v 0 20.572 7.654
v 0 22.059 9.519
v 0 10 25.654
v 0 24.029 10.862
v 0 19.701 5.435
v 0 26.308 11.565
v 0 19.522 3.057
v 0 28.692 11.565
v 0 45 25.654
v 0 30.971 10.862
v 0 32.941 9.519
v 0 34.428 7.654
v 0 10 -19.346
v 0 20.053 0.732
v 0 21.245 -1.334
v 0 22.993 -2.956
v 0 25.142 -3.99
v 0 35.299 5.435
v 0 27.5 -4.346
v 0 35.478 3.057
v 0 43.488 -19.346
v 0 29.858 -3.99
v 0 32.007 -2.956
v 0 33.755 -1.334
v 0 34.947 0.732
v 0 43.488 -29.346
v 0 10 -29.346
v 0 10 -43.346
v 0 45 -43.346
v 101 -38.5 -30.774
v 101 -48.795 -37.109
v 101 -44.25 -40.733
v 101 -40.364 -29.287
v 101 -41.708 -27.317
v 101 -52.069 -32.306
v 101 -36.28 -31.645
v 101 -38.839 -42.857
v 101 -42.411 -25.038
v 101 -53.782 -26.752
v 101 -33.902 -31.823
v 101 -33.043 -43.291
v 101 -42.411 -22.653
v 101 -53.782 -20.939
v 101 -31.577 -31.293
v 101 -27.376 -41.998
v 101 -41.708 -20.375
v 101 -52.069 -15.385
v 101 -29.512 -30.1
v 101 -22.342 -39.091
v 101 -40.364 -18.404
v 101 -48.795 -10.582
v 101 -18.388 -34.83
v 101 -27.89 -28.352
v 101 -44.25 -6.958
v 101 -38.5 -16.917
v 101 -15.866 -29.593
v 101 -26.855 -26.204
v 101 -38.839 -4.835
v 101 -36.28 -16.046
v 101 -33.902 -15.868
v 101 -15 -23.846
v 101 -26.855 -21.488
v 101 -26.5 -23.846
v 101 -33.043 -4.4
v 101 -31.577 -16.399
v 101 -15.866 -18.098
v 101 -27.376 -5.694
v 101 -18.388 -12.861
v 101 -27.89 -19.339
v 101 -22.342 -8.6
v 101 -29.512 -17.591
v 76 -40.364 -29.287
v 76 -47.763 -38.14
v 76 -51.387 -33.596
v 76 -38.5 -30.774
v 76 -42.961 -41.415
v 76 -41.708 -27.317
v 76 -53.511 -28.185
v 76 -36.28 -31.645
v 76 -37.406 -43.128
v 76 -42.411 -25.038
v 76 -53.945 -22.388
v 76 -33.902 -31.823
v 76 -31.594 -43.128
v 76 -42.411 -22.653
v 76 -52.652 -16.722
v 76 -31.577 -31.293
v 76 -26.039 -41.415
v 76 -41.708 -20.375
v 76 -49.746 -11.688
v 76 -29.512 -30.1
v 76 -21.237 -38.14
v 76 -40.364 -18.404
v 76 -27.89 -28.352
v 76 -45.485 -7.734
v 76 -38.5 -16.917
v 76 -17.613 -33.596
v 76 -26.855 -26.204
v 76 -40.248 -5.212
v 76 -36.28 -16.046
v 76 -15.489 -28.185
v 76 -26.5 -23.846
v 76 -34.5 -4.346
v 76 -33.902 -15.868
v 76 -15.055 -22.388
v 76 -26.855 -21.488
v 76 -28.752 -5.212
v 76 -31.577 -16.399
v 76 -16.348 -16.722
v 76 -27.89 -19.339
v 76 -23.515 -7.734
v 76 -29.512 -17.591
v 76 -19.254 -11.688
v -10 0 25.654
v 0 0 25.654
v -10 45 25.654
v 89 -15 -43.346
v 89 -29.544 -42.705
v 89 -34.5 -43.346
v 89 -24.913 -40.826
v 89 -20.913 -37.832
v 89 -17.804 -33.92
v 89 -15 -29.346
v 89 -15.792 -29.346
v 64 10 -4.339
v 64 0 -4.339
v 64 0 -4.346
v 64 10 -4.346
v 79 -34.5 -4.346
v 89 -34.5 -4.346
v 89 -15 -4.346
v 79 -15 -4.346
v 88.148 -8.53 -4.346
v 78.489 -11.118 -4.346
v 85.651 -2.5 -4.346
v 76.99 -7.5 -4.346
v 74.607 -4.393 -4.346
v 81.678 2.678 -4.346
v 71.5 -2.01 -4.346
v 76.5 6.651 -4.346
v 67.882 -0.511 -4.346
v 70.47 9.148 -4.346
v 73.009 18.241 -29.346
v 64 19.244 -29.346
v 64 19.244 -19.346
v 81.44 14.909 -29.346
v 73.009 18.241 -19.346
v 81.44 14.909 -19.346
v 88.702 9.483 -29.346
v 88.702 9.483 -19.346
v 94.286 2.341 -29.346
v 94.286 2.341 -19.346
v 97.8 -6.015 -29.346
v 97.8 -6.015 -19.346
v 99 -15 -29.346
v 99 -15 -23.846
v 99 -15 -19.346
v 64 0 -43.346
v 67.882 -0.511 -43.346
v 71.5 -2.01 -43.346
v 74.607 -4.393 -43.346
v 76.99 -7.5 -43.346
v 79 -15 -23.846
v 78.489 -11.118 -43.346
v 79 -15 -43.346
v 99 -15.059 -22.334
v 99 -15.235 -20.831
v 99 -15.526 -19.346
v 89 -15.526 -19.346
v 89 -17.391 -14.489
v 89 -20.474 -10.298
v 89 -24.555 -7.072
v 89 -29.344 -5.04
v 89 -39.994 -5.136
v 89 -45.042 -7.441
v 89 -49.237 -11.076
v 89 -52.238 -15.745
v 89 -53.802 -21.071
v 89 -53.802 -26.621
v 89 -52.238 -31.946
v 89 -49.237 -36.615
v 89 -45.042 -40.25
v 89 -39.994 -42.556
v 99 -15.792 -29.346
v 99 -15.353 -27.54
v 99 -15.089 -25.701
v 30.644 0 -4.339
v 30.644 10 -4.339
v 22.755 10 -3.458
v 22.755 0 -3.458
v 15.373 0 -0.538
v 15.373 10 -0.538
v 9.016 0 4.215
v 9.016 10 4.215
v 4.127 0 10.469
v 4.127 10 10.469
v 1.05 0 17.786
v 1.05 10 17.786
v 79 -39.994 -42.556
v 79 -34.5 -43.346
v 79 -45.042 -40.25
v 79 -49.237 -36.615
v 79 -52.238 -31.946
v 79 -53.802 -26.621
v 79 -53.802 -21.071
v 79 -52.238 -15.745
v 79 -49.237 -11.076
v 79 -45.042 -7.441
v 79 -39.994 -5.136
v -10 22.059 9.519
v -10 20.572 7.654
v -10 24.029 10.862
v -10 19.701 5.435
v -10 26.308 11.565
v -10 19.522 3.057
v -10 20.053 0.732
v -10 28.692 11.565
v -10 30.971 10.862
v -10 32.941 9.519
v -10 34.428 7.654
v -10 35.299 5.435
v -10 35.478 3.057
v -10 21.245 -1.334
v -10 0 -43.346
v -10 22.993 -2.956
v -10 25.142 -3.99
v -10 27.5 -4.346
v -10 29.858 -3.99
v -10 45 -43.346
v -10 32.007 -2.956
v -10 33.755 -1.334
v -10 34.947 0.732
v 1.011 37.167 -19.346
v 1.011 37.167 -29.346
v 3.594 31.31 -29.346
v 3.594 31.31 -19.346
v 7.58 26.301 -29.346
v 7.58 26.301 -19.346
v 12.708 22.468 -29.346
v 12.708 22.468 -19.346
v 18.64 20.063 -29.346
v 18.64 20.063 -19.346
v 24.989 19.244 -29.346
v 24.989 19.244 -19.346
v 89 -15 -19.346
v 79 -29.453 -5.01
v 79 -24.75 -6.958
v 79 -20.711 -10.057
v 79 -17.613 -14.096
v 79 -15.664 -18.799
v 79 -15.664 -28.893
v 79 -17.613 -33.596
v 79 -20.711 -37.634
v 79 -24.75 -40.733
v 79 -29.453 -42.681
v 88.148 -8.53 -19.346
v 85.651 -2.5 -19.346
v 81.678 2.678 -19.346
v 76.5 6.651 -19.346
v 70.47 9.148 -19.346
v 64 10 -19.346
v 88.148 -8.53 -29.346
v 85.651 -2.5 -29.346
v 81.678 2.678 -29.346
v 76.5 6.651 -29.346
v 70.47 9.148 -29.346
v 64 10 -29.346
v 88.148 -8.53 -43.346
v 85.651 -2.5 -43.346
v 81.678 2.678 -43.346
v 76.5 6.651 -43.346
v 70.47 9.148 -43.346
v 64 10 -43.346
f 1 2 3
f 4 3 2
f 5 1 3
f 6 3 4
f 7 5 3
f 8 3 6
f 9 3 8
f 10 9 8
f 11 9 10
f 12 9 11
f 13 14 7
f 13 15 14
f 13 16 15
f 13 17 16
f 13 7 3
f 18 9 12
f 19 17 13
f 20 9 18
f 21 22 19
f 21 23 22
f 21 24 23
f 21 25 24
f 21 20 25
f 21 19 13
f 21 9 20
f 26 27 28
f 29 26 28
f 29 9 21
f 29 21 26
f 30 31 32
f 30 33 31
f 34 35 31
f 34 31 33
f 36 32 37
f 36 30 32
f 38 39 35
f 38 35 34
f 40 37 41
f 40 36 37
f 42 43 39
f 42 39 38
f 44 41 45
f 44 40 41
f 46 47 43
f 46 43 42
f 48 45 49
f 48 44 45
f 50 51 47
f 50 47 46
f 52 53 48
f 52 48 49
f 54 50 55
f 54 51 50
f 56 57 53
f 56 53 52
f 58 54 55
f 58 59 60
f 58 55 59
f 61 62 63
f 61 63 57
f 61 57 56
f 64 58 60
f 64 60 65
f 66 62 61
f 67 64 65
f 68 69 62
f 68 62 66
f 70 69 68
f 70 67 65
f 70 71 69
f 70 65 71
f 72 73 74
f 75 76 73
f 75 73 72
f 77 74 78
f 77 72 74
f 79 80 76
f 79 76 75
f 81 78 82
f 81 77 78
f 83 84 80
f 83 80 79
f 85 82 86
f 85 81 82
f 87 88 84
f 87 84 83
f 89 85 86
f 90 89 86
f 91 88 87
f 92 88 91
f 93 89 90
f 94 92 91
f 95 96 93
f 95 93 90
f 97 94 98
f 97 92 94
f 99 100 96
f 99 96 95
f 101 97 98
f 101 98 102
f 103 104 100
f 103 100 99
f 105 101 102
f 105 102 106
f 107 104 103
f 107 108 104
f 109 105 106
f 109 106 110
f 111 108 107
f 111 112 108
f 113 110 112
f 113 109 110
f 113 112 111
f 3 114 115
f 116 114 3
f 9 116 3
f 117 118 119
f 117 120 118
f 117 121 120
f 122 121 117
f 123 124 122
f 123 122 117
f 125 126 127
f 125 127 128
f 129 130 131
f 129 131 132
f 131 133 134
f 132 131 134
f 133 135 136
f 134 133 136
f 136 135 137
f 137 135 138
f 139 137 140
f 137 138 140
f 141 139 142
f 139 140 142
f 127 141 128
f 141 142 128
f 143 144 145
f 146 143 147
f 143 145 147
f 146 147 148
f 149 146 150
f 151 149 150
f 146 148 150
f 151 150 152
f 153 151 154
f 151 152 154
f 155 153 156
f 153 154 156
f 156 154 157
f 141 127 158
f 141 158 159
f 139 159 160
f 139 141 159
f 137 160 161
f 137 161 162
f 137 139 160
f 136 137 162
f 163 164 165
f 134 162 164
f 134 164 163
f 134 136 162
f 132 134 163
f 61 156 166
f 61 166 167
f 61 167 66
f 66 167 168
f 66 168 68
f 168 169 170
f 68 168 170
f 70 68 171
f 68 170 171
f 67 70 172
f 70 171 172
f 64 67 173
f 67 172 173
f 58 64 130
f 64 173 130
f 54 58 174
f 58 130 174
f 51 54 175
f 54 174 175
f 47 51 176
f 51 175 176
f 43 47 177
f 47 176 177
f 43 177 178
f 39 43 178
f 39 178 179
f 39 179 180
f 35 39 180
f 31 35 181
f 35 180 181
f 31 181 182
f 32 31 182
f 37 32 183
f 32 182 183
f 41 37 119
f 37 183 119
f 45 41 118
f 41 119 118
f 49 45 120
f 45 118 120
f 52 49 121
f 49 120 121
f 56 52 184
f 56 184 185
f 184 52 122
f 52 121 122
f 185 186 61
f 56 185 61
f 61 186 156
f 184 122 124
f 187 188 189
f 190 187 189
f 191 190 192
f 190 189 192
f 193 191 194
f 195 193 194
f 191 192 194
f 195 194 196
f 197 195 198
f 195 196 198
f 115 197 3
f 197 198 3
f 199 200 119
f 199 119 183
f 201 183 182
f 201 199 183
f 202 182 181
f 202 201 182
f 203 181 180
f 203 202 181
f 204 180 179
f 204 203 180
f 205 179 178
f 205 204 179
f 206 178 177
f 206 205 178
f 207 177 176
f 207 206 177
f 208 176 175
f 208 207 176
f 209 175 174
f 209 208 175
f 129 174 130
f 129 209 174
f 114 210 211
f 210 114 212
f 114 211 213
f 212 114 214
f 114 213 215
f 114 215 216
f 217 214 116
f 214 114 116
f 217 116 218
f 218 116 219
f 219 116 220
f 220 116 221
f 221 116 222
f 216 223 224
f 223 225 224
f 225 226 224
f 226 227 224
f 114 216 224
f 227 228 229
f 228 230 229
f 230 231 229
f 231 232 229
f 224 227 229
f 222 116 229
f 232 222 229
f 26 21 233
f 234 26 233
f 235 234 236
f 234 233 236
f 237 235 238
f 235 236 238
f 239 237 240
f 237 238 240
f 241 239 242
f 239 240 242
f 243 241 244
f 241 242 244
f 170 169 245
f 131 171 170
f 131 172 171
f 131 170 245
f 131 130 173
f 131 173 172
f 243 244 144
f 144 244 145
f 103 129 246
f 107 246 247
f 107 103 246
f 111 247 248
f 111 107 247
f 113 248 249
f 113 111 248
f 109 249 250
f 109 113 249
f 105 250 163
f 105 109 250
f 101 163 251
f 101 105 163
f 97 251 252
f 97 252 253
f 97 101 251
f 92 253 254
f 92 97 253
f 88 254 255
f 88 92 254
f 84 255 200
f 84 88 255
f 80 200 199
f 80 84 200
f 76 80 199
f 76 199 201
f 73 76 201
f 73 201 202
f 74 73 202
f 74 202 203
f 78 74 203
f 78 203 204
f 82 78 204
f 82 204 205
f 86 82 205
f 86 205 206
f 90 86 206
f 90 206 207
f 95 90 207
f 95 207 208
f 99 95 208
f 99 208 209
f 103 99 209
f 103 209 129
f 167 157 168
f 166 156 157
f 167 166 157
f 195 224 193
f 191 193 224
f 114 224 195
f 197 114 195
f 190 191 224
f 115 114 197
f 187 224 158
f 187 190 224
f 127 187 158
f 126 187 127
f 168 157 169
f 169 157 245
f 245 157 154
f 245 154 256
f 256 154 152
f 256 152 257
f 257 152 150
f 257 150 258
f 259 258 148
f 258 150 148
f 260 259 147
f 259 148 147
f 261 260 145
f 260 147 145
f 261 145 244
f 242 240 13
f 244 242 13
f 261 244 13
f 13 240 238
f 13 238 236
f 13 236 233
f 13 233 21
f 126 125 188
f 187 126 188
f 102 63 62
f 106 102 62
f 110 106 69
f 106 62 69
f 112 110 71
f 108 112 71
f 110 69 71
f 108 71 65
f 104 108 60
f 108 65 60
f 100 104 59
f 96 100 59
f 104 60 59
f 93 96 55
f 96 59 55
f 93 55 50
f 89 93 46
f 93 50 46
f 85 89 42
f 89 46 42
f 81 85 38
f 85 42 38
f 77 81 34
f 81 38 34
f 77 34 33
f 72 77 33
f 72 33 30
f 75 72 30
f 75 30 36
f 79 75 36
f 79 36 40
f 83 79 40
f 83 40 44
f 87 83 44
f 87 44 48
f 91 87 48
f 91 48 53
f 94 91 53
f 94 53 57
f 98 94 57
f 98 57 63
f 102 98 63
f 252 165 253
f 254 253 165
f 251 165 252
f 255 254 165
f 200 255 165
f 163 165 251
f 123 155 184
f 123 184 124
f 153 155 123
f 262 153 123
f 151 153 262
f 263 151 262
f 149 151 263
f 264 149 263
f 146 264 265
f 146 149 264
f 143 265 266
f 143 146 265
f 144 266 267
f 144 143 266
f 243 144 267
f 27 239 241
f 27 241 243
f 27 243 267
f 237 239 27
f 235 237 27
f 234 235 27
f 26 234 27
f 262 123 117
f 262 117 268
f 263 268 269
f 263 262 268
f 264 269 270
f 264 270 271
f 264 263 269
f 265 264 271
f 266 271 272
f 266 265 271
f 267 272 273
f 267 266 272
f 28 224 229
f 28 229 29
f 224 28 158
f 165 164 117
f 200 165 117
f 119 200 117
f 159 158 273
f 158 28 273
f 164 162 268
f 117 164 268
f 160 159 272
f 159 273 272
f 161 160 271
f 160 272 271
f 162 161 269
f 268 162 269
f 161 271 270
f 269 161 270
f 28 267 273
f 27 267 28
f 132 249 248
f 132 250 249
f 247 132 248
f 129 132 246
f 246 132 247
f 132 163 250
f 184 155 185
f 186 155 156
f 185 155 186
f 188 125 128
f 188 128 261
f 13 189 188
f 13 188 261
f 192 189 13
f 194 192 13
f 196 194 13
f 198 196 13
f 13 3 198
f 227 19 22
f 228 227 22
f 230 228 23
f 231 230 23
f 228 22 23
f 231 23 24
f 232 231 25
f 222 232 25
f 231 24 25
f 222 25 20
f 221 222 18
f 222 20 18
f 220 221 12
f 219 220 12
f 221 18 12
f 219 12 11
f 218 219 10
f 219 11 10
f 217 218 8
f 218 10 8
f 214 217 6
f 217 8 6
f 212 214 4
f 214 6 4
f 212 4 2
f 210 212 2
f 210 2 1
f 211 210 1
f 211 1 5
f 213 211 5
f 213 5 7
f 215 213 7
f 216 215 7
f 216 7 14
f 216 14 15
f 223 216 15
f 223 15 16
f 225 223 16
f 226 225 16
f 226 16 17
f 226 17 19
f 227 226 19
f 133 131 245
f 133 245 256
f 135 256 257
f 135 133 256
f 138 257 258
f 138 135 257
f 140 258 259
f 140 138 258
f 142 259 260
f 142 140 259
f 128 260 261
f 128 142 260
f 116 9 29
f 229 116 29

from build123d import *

# Parameters (mm, degrees)
SKETCH1_W           = 69
SKETCH1_H           = 45
BOSS_EXTRUDE1_DEPTH = 10
BOSS_EXTRUDE2_DEPTH = 69
CUT_EXTRUDE1_DEPTH  = 69
CUT_EXTRUDE2_DEPTH  = 30
SKETCH6_R           = 19.5
BOSS_EXTRUDE3_DEPTH = 12
CUT_EXTRUDE3_START  = -12
CUT_EXTRUDE3_DEPTH  = 12
BOSS_EXTRUDE4_START = 3
SKETCH8_R           = 19.5
BOSS_EXTRUDE4_DEPTH = 3
CUT_EXTRUDE4_REACH  = 124.458
SKETCH9_R           = 8
BOSS_EXTRUDE5_DEPTH = 5
CUT_EXTRUDE5_REACH  = 132.828
SKETCH14_R          = 8


with BuildPart() as part:
    # Sketch1 → Boss-Extrude1 (new body)
    with BuildSketch(Plane(origin=(0, 0, 0), x_dir=(0, 0, -1), z_dir=(1, 0, 0))):
        with Locations((8.845653905, 22.5)):
            Rectangle(SKETCH1_W, SKETCH1_H)
    extrude(amount=-BOSS_EXTRUDE1_DEPTH)

    # Sketch2 → Boss-Extrude2 (add)
    with BuildSketch(Plane.XY.offset(25.654346095)):
        with BuildLine():
            Line((64, 10), (0, 10))
            Line((0, 10), (0, 0))
            Line((0, 0), (44.854374374, 0))
            Line((44.854374374, 0), (64, 0))
            ThreePointArc((64, 0), (74.606601718, -4.393398282), (79, -15))
            Line((79, -15), (79, -55.367791419))
            Line((79, -55.367791419), (89, -55.367791419))
            Line((89, -55.367791419), (89, -15))
            ThreePointArc((89, -15), (81.67766953, 2.67766953), (64, 10))
        make_face()
    extrude(amount=-BOSS_EXTRUDE2_DEPTH)

    # Sketch4 → Cut-Extrude1 (cut)
    with BuildSketch(Plane(origin=(0, 10, 0), x_dir=(1, 0, 0), z_dir=(0, 1, 0))):
        with BuildLine():
            ThreePointArc((30.643579789, 4.338749862), (9.015569982, -4.21481026), (0, -25.654346095))
            Line((0, -25.654346095), (64, -25.654346095))
            Line((64, -25.654346095), (64, 4.338749862))
            Line((64, 4.338749862), (30.643579789, 4.338749862))
        make_face()
    extrude(amount=-CUT_EXTRUDE1_DEPTH, mode=Mode.SUBTRACT)

    # Sketch5 → Cut-Extrude2 (cut)
    with BuildSketch(Plane.XY.offset(25.654346095)):
        with BuildLine():
            Line((79, -15), (79, -55.367791419))
            Line((79, -55.367791419), (89, -55.367791419))
            Line((89, -55.367791419), (89, -15))
            ThreePointArc((89, -15), (81.67766953, 2.67766953), (64, 10))
            Line((64, 10), (64, 0))
            ThreePointArc((64, 0), (74.606601718, -4.393398282), (79, -15))
        make_face()
    extrude(amount=-CUT_EXTRUDE2_DEPTH, mode=Mode.SUBTRACT)

    # Sketch6 → Boss-Extrude3 (add)
    with BuildSketch(Plane(origin=(89, 0, 0), x_dir=(0, 0, -1), z_dir=(1, 0, 0))):
        with Locations((23.845653905, -34.5)):
            Circle(SKETCH6_R)
    extrude(amount=BOSS_EXTRUDE3_DEPTH)

    # Sketch7 → Cut-Extrude3 (cut)
    with BuildSketch(Plane(origin=(89, 0, 0), x_dir=(0, 0, -1), z_dir=(1, 0, 0)).offset(CUT_EXTRUDE3_START)):
        with BuildLine():
            Line((4.345653905, -34.5), (4.345653905, -55.367791419))
            Line((4.345653905, -55.367791419), (43.345653905, -55.367791419))
            Line((43.345653905, -55.367791419), (43.345653905, -34.5))
            ThreePointArc((43.345653905, -34.5), (23.845653905, -54), (4.345653905, -34.5))
        make_face()
    extrude(amount=CUT_EXTRUDE3_DEPTH, mode=Mode.SUBTRACT)

    # Sketch8 → Boss-Extrude4 (add)
    with BuildSketch(Plane.ZY.offset(-79).offset(BOSS_EXTRUDE4_START)):
        with Locations((-23.845653905, -34.5)):
            Circle(SKETCH8_R)
    extrude(amount=-BOSS_EXTRUDE4_DEPTH)

    # Sketch9 → Cut-Extrude4 (cut, up to next)
    with BuildSketch(Plane(origin=(0, 0, 0), x_dir=(0, 0, -1), z_dir=(1, 0, 0)), mode=Mode.PRIVATE) as cut_extrude4_sk1:
        with Locations((-3.654346095, 27.5)):
            Circle(SKETCH9_R)
    cut_extrude4_tool1 = extrude(cut_extrude4_sk1.sketch, amount=-CUT_EXTRUDE4_REACH, mode=Mode.PRIVATE) & part.part
    add(cut_extrude4_tool1.solids().sort_by_distance((0, 27.5, 3.654346))[0], mode=Mode.SUBTRACT)

    # Sketch13 → Boss-Extrude5 (add, symmetric)
    with BuildSketch(Plane(origin=(0, 0, -24.345653905), x_dir=(-1, 0, 0), z_dir=(0, 0, -1))):
        with BuildLine():
            Line((0, 10), (0, 43.487506986))
            ThreePointArc((0, 43.487506986), (-7.58031637, 26.300702433), (-24.988559207, 19.243753493))
            Line((-24.988559207, 19.243753493), (-64, 19.243753493))
            ThreePointArc((-64, 19.243753493), (-88.701898796, 9.482823843), (-99, -15))
            Line((-99, -15), (-99, -34.5))
            Line((-99, -34.5), (-89, -34.5))
            Line((-89, -34.5), (-89, -15))
            ThreePointArc((-89, -15), (-81.67766953, 2.67766953), (-64, 10))
            Line((-64, 10), (0, 10))
        make_face()
    extrude(amount=BOSS_EXTRUDE5_DEPTH, both=True)

    # Sketch14 → Cut-Extrude5 (cut, up to next)
    with BuildSketch(Plane(origin=(101, 0, 0), x_dir=(0, 0, -1), z_dir=(1, 0, 0)), mode=Mode.PRIVATE) as cut_extrude5_sk1:
        with Locations((23.845653905, -34.5)):
            Circle(SKETCH14_R)
    cut_extrude5_tool1 = extrude(cut_extrude5_sk1.sketch, amount=-CUT_EXTRUDE5_REACH, mode=Mode.PRIVATE) & part.part
    add(cut_extrude5_tool1.solids().sort_by_distance((101, -34.5, -23.845654))[0], mode=Mode.SUBTRACT)


solid = part.part
